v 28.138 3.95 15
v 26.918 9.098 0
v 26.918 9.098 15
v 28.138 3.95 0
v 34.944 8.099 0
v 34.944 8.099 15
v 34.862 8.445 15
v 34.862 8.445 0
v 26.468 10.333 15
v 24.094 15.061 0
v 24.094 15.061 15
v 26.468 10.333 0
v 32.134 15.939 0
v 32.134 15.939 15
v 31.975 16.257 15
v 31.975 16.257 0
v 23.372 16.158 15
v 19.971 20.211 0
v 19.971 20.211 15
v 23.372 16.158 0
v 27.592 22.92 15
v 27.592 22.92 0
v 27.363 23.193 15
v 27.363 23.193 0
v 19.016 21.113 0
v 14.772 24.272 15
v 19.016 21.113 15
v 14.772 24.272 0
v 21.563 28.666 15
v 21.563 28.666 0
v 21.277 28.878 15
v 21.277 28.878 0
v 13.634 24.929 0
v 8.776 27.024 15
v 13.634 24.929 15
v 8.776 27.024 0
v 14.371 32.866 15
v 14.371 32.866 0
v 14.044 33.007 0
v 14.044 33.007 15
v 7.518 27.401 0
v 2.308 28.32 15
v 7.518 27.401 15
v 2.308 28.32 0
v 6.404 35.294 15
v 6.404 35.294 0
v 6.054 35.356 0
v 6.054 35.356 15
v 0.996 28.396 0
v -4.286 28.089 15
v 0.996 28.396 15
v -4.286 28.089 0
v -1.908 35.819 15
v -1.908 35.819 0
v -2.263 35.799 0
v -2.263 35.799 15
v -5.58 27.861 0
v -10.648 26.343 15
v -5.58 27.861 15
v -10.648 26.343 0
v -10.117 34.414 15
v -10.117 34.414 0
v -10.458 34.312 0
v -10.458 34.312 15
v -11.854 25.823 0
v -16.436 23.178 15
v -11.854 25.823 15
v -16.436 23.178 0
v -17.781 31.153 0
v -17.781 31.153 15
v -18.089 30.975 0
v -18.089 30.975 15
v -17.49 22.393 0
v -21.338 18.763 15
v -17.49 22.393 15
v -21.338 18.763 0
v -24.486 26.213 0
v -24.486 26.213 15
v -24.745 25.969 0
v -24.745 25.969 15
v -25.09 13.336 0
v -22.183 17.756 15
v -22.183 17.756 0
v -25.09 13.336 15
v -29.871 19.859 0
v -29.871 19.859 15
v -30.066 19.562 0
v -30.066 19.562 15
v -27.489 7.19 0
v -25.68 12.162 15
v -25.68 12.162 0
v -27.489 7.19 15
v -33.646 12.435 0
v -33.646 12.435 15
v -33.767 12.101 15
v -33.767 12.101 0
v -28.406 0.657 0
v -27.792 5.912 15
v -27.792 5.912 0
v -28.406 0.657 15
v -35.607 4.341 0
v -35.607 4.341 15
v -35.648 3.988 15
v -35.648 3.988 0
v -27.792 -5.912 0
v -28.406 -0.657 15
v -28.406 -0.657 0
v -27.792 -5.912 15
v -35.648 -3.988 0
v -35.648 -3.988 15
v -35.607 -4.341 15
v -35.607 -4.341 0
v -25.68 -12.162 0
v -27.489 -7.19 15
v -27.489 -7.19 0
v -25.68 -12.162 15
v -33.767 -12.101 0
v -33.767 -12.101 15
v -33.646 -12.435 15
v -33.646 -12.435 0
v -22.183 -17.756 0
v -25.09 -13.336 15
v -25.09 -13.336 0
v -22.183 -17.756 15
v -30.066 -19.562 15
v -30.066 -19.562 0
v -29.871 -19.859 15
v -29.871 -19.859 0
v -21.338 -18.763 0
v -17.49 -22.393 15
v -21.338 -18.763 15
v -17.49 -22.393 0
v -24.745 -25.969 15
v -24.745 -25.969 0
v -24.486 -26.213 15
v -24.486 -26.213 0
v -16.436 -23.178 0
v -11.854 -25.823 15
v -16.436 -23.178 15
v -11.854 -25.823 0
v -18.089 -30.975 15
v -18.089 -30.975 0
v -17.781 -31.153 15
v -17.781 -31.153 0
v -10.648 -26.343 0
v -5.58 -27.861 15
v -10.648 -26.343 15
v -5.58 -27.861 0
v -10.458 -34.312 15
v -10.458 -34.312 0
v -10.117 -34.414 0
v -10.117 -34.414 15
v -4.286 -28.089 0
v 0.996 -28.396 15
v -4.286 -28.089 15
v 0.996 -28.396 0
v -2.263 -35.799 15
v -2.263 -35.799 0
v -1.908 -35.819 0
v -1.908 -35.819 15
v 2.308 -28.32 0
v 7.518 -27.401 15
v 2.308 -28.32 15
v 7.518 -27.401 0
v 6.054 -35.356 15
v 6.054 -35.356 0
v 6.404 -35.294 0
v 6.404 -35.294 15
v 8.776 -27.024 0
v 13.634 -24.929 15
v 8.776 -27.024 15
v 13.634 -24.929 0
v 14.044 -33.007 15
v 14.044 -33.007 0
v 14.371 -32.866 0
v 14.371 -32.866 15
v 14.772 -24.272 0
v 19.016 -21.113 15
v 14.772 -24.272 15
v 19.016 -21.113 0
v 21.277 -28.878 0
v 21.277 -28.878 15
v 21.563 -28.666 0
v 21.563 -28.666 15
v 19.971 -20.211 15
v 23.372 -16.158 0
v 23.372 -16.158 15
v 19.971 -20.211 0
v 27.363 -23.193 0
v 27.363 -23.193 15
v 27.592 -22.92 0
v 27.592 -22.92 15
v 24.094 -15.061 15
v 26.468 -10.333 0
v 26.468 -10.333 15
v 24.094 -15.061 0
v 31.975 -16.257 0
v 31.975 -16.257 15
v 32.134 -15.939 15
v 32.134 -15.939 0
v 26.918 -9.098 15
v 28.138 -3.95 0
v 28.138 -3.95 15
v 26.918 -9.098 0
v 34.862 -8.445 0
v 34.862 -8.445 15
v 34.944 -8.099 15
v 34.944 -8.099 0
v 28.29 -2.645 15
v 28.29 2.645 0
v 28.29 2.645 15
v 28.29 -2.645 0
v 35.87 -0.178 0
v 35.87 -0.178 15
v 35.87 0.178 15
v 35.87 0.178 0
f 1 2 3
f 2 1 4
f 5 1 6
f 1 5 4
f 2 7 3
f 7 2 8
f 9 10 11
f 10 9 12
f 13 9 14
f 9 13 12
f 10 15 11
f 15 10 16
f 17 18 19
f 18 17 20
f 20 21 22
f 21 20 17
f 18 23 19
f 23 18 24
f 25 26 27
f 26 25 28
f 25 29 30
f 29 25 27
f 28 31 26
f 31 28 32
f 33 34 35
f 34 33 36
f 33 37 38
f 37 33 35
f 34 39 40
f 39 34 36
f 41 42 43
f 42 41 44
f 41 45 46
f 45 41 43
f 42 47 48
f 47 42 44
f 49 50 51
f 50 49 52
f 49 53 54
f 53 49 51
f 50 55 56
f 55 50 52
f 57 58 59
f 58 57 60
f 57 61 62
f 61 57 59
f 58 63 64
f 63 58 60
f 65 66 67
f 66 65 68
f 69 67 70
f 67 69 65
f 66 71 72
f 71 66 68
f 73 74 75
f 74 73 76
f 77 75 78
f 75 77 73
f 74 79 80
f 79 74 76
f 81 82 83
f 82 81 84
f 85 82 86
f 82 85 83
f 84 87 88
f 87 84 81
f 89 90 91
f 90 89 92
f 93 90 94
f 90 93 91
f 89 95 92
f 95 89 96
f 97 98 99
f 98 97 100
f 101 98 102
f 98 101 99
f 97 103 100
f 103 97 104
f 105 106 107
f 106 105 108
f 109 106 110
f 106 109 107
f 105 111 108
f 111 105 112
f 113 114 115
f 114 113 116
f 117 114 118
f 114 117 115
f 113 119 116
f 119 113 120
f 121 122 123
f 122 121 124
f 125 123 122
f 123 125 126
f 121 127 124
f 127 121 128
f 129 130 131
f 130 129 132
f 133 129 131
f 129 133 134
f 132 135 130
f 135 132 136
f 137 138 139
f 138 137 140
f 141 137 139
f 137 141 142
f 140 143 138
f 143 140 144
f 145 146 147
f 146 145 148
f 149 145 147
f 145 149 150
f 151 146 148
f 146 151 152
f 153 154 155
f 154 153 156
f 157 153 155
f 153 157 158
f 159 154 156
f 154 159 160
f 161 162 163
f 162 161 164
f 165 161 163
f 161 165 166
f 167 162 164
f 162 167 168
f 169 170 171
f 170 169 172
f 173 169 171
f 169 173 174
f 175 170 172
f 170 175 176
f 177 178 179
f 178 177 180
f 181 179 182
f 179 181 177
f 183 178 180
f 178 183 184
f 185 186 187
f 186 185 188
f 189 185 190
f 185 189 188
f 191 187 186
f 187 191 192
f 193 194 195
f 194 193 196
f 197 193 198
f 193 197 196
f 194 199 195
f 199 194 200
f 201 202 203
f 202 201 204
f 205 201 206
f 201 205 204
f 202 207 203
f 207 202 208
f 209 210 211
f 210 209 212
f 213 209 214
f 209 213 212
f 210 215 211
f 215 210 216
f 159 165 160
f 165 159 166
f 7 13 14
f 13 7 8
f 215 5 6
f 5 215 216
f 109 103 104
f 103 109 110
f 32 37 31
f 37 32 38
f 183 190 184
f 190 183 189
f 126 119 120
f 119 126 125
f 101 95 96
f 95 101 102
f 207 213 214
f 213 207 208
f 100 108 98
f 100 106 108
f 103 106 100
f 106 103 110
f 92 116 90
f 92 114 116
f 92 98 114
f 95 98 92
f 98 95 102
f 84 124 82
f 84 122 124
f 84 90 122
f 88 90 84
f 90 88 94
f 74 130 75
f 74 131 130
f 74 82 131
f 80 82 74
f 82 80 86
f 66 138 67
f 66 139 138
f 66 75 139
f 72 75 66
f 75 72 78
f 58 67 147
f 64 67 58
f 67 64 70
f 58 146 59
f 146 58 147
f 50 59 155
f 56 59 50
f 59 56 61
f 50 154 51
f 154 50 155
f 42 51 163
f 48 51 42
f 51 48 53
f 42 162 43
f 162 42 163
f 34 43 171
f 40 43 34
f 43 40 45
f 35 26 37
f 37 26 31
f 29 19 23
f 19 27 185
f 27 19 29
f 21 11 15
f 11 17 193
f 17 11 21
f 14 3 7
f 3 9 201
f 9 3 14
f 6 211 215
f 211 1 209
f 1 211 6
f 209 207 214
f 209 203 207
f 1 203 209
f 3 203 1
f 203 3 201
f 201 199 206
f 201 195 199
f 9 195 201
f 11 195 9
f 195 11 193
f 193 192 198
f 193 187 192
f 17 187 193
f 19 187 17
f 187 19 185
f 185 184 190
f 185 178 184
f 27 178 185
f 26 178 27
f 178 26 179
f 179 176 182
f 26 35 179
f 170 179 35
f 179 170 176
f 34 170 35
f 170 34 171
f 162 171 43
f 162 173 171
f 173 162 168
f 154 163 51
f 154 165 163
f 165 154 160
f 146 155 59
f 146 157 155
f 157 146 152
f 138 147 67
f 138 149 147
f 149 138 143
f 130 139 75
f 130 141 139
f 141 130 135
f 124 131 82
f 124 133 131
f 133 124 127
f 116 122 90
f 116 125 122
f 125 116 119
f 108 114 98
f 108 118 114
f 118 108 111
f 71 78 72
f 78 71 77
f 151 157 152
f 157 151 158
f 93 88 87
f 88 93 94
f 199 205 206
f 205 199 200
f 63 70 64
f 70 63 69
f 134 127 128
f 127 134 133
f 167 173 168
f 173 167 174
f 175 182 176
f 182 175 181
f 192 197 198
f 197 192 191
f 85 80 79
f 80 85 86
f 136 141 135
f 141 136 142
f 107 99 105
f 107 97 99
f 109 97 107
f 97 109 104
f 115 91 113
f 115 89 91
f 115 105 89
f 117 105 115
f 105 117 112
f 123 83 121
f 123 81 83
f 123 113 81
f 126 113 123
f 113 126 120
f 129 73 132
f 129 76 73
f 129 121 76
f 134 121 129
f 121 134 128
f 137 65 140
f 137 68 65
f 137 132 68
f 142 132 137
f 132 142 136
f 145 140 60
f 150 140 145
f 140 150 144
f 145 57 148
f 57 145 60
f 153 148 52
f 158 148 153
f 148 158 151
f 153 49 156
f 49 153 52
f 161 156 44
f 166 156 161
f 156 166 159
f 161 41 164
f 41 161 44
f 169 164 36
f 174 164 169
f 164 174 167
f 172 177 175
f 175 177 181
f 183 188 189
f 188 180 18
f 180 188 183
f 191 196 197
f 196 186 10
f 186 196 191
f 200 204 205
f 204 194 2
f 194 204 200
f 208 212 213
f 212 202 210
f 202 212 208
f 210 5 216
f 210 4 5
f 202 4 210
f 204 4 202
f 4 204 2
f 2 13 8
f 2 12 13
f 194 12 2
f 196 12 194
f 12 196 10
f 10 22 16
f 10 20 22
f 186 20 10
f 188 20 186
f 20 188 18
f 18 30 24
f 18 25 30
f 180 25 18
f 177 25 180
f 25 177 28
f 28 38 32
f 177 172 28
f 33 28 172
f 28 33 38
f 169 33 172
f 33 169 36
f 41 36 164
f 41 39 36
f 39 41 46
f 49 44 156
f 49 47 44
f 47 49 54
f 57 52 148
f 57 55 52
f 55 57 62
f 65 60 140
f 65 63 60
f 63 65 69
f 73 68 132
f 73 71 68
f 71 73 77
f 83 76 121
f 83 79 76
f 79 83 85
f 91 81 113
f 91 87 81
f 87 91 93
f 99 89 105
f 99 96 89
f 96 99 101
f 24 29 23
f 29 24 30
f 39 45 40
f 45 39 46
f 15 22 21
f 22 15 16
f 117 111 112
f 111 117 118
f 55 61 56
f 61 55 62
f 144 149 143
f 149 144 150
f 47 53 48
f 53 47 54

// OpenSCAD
// stretchy bracelet

r2=30;// major radius
h=8;// thickness (difference in radius between inside and outside
w=15;// width
t=0.4;// layer width and gap width
n=20;// number of twisty shapes around the circle
m=27;// number of bendy parts around the circle

pi=3.14159;
rr=pi*r2/n;
r1=rr*1.5;
ro=r2+(r1+rr)*0.5;
ri=ro-h;
a=pi*2*ri/m-t;
echo("Inside Diameter = ",2*ri);

solid();
//hollow();

module solid(){
difference(){
	// Uncomment one of these three lines for different styles
	//base(r1=r1,w=w);// original angled cording
	//base1(r1=r1,w=w);// horizontal cording
	cylinder(r=ro,h=w,$fn=m);// flat

	for(i=[1:m])rotate([0,0,i*360/m])
		translate([0,0,-0.03])linear_extrude(height=w+0.06)
			polygon(points=[[ri+t,a/2-t],[ri+t,t-a/2],[ro+t*h/a,0]],paths=[[0,1,2]]);
}}

module hollow(){
difference(){
	base(r1=r1,w=w);
	difference(){
		translate([0,0,-0.01])base(r1=r1-t,w=w+0.02);
		for(i=[1:m])rotate([0,0,i*360/m])
			translate([0,0,-0.02])linear_extrude(height=w+0.04)
				polygon(points=[[ri,a/2],[ri,-a/2],[ro+3*t*h/a,0]],paths=[[0,1,2]]);
	}
	for(i=[1:m])rotate([0,0,i*360/m])
		translate([0,0,-0.03])linear_extrude(height=w+0.06)
			polygon(points=[[ri+t,a/2-t],[ri+t,t-a/2],[ro+t*h/a,0]],paths=[[0,1,2]]);
}}

module base(r1,w){
render()
union(){	
	cylinder(r=r2+rr*0.5,h=w);
	for(i=[1:n]){
		rotate([0,0,i*360/n])translate([0,-r2,0])
		scale([1,0.5,1])linear_extrude(height=w,twist=180,slices=10)
			translate([rr,0,0])circle(r=r1,$fn=20);
	}
}}

module base1(r1,w){
union(){	
	cylinder(r=ro-1.5,h=w,$fn=100);
	for(i=[1:3]){
		translate([0,0,(i-1)*4.5+3])scale([1,1,2])rotate_extrude($fn=100)
			translate([ro-1.5,0,0])circle(r=1.5,$fn=20);
	}
}}
